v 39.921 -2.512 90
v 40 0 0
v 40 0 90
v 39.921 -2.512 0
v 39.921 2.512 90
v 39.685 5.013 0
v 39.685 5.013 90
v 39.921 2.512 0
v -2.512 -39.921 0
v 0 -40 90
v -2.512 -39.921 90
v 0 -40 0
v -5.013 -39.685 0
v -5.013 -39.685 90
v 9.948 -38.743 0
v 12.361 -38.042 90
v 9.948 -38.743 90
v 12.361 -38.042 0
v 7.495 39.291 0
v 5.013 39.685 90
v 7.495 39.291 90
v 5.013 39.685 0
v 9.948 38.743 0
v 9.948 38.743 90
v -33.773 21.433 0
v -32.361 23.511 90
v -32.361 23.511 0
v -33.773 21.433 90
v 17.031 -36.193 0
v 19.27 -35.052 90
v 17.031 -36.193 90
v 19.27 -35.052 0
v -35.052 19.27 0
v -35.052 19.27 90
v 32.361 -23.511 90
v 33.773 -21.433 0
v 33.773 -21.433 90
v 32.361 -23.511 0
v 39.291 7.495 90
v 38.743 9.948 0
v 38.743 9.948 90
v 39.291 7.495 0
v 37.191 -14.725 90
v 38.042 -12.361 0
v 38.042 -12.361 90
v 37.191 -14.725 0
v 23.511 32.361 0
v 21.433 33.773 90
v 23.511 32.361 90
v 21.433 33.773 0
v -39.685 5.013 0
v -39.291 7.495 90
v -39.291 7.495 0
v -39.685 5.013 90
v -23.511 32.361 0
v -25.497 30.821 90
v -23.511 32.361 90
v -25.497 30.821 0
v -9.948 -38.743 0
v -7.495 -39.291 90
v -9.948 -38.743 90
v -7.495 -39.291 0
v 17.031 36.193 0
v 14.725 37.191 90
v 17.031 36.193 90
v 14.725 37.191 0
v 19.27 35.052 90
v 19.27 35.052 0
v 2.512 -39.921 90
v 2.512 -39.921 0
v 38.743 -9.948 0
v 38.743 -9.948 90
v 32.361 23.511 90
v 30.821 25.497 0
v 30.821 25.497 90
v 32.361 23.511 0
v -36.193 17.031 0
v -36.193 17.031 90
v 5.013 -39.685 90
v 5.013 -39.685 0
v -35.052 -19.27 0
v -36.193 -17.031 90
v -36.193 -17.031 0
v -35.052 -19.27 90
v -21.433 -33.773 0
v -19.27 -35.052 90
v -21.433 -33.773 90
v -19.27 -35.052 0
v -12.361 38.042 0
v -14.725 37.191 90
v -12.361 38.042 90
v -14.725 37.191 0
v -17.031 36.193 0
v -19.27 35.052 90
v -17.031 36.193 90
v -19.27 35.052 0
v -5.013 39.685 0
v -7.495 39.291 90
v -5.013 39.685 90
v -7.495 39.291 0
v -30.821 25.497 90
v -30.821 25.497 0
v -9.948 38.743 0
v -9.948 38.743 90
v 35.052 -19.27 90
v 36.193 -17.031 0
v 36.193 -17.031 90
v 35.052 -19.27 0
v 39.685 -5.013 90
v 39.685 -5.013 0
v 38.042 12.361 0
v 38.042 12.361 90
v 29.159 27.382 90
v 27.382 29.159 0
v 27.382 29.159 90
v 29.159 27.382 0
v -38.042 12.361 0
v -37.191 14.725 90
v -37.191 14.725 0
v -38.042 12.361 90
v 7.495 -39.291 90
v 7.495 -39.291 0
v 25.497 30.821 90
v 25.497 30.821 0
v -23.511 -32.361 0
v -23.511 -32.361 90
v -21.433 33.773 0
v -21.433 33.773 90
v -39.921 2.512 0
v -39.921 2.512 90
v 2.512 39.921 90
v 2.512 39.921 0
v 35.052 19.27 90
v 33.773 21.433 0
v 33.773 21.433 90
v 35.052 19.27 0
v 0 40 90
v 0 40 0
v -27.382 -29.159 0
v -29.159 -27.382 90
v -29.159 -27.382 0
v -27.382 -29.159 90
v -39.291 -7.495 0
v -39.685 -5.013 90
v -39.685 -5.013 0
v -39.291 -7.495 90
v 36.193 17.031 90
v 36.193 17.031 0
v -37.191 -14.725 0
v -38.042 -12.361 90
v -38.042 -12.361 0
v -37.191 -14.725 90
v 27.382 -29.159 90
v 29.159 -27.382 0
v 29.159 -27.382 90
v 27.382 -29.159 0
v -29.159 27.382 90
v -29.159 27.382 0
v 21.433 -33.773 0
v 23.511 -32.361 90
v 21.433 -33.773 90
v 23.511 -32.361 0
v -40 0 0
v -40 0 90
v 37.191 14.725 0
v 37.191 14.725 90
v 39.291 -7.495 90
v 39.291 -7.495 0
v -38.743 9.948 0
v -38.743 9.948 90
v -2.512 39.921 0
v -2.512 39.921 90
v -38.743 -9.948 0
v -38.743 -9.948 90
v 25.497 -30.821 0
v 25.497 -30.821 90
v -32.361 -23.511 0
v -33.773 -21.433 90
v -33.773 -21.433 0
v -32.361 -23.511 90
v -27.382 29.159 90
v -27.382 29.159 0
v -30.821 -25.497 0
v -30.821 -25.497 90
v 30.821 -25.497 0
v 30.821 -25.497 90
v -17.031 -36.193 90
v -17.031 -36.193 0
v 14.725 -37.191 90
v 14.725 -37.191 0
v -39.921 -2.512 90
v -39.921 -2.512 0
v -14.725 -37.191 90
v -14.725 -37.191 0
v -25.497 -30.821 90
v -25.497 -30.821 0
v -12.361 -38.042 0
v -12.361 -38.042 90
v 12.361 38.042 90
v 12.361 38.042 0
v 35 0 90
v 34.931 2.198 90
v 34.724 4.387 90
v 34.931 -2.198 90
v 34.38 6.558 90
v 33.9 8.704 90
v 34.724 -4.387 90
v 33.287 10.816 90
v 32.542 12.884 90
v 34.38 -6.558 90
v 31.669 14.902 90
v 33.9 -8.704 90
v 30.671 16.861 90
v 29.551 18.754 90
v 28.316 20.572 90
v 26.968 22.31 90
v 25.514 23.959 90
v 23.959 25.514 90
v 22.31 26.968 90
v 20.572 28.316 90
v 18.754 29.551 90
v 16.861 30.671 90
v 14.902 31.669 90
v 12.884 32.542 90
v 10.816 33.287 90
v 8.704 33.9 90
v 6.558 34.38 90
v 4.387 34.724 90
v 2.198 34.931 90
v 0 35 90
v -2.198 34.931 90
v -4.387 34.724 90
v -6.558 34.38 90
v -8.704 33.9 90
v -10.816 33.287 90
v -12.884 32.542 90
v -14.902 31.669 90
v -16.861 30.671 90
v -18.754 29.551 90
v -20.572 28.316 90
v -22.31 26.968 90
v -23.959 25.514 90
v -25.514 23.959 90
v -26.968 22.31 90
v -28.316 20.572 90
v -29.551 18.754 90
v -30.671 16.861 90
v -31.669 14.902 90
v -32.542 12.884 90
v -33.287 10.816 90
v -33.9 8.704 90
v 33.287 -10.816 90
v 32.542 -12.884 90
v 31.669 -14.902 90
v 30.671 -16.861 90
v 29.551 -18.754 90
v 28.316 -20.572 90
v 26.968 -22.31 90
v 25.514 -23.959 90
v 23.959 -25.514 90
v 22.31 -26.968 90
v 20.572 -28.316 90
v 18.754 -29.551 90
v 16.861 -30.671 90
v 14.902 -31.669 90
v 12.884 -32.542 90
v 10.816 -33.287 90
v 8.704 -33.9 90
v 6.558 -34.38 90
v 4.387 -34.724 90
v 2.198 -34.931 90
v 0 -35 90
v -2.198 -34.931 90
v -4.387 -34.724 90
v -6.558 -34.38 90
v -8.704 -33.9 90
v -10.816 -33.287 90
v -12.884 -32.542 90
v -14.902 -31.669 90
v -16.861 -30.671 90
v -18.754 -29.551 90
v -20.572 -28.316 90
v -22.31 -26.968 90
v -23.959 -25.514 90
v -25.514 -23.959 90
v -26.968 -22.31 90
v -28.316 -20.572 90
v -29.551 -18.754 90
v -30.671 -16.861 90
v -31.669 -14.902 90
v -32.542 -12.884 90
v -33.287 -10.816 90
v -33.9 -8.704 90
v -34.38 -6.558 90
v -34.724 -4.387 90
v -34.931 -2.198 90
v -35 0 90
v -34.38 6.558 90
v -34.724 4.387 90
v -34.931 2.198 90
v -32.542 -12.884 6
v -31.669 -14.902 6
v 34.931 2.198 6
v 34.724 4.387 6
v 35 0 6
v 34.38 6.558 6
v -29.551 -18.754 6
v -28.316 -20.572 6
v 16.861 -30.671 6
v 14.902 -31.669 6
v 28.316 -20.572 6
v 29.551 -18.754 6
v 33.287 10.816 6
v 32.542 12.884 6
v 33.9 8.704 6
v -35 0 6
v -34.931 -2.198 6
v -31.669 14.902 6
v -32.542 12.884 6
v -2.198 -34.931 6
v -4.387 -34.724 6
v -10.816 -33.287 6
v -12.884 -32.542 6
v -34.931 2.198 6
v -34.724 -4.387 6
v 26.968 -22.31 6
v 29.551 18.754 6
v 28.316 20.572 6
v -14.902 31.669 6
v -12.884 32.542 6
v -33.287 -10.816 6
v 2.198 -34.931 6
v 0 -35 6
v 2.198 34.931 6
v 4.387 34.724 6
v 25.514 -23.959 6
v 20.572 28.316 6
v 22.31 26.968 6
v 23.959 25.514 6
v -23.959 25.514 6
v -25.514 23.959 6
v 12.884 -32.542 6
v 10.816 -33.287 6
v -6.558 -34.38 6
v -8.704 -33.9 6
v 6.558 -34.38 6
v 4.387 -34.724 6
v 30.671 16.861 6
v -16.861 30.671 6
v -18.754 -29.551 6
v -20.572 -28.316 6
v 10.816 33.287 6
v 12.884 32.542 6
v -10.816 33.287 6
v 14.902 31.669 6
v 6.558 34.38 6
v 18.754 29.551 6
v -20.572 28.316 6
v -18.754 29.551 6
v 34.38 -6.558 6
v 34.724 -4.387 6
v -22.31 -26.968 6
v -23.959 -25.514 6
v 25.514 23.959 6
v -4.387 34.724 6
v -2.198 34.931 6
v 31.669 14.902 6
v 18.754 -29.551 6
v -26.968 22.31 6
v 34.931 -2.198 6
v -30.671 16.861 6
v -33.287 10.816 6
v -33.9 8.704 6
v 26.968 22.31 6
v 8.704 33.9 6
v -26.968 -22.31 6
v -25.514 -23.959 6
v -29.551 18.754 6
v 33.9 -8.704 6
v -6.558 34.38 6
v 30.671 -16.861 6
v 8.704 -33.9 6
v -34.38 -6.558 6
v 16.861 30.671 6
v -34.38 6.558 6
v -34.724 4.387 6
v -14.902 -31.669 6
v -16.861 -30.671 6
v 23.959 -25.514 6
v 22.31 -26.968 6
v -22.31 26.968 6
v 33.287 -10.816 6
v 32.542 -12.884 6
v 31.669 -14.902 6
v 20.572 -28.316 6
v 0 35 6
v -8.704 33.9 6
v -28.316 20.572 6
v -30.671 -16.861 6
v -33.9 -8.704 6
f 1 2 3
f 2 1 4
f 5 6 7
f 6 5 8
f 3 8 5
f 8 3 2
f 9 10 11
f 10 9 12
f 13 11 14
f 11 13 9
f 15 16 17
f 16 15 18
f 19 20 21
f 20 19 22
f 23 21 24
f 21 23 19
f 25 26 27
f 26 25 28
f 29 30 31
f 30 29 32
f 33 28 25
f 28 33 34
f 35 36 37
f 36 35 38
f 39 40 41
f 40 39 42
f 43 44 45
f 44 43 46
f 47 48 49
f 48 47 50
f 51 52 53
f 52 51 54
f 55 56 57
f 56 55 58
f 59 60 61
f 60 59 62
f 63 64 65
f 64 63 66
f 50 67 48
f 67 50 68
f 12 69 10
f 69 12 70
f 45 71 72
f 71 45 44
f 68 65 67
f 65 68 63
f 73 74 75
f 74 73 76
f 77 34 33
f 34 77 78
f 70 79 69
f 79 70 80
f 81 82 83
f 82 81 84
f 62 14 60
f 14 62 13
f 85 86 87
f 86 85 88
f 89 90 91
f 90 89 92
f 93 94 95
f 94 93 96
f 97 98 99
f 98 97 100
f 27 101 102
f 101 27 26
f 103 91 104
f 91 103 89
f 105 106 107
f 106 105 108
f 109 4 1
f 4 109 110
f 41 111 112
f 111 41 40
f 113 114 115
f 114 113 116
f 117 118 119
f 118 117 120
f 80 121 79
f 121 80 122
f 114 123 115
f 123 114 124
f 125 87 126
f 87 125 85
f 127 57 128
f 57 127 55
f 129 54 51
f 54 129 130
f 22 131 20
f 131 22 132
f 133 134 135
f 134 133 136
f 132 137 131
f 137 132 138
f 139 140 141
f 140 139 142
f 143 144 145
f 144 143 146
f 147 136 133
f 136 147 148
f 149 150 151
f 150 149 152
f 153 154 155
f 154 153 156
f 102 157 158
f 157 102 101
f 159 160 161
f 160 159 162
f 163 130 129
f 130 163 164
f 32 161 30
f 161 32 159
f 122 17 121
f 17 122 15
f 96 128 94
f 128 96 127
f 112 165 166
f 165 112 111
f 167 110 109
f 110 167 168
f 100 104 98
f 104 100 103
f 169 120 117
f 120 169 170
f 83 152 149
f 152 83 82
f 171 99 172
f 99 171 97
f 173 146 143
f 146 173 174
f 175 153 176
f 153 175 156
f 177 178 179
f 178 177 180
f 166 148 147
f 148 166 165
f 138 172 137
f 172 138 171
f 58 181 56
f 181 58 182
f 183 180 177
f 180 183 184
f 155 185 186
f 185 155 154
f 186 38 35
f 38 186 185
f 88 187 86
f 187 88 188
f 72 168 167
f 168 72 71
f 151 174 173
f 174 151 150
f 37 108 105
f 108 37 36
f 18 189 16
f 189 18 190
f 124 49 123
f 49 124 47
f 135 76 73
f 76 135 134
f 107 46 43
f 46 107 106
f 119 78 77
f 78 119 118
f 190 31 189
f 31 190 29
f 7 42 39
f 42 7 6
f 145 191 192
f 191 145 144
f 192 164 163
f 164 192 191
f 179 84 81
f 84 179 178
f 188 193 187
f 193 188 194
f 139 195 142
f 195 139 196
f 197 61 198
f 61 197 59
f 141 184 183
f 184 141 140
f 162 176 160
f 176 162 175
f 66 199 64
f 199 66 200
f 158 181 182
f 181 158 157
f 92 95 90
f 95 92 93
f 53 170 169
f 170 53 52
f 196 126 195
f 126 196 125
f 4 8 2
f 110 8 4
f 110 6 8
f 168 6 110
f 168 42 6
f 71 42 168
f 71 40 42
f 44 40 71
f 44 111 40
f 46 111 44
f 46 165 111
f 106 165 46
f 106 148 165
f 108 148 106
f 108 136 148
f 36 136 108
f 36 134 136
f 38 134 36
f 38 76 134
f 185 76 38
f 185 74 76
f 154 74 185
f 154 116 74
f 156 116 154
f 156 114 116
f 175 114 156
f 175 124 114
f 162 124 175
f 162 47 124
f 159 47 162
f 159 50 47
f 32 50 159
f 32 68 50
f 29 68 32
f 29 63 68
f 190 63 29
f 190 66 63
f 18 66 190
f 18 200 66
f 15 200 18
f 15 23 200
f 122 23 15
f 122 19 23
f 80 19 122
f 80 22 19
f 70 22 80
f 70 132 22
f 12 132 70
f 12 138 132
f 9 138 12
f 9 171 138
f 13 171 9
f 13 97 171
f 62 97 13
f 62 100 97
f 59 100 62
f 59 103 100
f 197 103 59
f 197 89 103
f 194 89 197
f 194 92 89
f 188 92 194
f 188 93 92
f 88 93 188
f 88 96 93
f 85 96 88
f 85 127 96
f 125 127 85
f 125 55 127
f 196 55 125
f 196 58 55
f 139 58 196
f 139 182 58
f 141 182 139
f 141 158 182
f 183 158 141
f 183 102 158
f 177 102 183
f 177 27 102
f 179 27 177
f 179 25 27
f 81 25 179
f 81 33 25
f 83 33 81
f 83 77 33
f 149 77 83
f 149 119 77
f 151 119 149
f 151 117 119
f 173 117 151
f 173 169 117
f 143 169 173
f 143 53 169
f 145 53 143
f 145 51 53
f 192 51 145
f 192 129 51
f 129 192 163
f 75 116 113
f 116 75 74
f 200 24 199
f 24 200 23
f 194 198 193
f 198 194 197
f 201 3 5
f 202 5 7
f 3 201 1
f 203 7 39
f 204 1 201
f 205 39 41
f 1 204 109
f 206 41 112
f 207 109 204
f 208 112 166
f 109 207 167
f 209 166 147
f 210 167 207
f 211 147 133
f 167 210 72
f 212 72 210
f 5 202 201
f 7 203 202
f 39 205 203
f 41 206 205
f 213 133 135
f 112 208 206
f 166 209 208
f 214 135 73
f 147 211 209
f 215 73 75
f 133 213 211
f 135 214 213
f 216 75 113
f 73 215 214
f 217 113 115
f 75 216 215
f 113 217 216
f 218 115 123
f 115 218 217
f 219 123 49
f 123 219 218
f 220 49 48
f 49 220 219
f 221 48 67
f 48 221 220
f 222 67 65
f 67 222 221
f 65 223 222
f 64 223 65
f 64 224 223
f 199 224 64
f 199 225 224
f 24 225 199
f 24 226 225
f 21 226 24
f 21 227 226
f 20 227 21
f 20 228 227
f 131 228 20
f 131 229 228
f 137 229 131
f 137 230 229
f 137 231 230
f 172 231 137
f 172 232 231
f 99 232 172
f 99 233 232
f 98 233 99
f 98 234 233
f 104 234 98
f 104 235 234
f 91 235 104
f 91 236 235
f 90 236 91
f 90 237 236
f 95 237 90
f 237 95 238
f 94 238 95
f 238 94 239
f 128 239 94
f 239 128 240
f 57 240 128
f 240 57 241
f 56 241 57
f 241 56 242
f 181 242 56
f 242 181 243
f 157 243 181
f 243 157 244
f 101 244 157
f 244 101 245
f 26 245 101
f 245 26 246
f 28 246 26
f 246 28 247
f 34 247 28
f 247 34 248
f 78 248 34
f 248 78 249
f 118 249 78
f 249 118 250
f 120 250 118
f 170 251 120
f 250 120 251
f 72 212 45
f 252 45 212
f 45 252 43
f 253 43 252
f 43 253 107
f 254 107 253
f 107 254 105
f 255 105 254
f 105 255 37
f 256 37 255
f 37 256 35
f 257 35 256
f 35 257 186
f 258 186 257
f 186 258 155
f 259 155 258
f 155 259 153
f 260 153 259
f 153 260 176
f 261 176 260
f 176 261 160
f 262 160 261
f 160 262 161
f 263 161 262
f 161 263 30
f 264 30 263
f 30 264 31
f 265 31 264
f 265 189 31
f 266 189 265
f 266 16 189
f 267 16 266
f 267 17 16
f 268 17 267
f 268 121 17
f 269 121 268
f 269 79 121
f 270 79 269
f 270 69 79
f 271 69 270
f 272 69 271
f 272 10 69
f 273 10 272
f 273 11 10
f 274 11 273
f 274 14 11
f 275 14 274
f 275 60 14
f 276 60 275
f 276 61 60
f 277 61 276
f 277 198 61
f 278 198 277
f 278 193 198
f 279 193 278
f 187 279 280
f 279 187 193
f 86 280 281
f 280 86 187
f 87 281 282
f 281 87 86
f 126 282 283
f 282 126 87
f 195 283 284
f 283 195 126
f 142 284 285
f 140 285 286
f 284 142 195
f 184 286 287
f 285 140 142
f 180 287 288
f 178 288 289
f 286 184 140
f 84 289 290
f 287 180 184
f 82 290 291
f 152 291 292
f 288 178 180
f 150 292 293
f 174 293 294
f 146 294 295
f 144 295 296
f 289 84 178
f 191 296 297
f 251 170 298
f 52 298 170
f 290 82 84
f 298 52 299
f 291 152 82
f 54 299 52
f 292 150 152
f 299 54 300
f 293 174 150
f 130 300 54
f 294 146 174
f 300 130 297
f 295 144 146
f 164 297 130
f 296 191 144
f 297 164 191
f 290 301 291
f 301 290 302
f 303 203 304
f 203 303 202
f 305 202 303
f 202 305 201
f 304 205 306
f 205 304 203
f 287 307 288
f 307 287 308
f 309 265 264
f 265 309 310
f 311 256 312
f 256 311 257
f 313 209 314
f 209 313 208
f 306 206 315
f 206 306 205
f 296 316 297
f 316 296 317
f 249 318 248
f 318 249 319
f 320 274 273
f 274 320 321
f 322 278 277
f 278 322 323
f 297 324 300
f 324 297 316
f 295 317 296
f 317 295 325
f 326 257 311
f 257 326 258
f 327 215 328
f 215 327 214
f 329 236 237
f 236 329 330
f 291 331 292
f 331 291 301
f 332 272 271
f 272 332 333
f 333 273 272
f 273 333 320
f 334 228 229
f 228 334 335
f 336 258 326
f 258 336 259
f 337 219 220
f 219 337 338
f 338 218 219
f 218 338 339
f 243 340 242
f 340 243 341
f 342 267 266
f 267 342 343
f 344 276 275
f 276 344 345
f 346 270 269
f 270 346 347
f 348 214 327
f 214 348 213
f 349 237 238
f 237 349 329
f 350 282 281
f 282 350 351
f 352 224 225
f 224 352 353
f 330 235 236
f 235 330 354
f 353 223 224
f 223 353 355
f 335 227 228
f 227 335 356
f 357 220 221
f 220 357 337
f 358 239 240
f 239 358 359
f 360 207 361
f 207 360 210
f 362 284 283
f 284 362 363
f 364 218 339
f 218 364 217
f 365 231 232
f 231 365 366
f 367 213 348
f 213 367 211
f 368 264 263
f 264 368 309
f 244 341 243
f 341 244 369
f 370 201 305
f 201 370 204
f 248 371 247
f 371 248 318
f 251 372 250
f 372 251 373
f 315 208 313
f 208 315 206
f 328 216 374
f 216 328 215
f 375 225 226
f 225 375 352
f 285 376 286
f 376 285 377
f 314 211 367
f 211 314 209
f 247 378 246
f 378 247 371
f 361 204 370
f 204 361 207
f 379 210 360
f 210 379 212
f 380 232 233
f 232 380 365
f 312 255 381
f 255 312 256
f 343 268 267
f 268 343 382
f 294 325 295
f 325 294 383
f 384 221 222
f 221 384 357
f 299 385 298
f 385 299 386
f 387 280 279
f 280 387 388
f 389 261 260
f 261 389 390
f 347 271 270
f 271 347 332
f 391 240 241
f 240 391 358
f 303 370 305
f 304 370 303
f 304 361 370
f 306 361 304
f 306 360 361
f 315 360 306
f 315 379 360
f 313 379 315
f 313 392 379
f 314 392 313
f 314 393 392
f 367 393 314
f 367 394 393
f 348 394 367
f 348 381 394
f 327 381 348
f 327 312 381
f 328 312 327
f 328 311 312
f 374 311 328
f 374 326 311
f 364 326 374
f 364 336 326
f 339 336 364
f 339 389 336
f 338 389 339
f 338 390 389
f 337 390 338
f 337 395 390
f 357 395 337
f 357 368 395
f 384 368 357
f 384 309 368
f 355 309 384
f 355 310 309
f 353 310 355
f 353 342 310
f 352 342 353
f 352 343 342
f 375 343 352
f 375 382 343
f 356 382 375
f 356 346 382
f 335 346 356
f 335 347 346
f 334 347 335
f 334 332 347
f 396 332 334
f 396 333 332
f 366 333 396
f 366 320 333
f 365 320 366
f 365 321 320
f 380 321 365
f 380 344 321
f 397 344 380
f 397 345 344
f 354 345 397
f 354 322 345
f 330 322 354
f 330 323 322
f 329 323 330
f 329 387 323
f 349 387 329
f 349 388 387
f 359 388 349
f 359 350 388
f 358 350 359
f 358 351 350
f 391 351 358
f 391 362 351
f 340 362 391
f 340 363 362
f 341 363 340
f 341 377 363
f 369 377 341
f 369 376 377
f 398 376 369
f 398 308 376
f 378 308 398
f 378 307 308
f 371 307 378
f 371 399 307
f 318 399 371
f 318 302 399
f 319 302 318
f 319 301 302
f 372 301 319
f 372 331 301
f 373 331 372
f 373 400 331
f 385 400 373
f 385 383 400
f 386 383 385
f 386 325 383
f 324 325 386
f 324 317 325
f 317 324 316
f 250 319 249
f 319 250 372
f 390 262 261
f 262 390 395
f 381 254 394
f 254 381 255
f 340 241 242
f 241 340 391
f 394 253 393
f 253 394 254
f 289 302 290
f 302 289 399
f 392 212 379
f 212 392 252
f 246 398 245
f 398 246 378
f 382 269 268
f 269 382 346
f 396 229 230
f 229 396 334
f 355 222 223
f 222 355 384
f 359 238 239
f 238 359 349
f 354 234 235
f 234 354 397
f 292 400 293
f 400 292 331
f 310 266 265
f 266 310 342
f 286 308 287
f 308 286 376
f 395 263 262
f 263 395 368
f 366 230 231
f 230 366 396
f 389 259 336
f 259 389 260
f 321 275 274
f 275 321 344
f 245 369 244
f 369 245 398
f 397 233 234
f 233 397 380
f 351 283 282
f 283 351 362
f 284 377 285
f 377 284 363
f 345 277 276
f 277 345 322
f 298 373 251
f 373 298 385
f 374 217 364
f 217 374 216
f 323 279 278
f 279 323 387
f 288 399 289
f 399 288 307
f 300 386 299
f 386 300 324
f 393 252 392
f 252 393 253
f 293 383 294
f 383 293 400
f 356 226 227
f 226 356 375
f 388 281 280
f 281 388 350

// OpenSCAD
// マグカップ

$fn = 100;

// 本体パラメータ
outer_d = 80;
inner_d = 70;
height = 90;
bottom_thickness = 6;

// 取手パラメータ
handle_inner_h = 30;   // 取手内側の高さ
handle_inner_w = 25;   // 取手内側の幅(本体からの突き出し)
handle_thickness = 8;  // 取手の太さ

module mug_body() {
    difference() {
        cylinder(d = outer_d, h = height);
        translate([0, 0, bottom_thickness])
            cylinder(d = inner_d, h = height - bottom_thickness + 0.01);
    }
}

module handle() {
    // 取手は XZ 平面上に置いた 2D D 字形状を作り、Y 方向に押し出す
    // 取手全体: 高さ(Z) = handle_inner_h + 2*handle_thickness
    //          幅(X)  = handle_inner_w + handle_thickness(本体側の壁分)
    
    handle_outer_h = handle_inner_h + 2 * handle_thickness; // Z 方向
    handle_outer_w = handle_inner_w + handle_thickness;     // X 方向
    
    z_center = height / 2;
    // 本体外周に少し食い込ませて確実に union
    x_base = outer_d/2 - 1;
    
    translate([x_base, 0, z_center])
        rotate([90, 0, 0])  // XZ平面の2D図形をXY平面で描き、Y押し出し→rotateで縦に
            translate([0, 0, -handle_thickness/2])
                linear_extrude(height = handle_thickness)
                    difference() {
                        // 外形 D 字 (XY平面で X方向に伸びる、Y軸が高さ方向)
                        hull() {
                            // 本体側の直線部(Y軸方向の薄い長方形)
                            translate([0, 0])
                                square([0.1, handle_outer_h], center = true);
                            // 外側の半円
                            translate([handle_outer_w - handle_outer_h/2, 0])
                                circle(d = handle_outer_h);
                        }
                        // 内側の穴 (D字の内側)
                        hull() {
                            translate([handle_thickness, 0])
                                square([0.1, handle_inner_h], center = true);
                            translate([handle_thickness + handle_inner_w - handle_inner_h/2, 0])
                                circle(d = handle_inner_h);
                        }
                    }
}

union() {
    mug_body();
    handle();
}
